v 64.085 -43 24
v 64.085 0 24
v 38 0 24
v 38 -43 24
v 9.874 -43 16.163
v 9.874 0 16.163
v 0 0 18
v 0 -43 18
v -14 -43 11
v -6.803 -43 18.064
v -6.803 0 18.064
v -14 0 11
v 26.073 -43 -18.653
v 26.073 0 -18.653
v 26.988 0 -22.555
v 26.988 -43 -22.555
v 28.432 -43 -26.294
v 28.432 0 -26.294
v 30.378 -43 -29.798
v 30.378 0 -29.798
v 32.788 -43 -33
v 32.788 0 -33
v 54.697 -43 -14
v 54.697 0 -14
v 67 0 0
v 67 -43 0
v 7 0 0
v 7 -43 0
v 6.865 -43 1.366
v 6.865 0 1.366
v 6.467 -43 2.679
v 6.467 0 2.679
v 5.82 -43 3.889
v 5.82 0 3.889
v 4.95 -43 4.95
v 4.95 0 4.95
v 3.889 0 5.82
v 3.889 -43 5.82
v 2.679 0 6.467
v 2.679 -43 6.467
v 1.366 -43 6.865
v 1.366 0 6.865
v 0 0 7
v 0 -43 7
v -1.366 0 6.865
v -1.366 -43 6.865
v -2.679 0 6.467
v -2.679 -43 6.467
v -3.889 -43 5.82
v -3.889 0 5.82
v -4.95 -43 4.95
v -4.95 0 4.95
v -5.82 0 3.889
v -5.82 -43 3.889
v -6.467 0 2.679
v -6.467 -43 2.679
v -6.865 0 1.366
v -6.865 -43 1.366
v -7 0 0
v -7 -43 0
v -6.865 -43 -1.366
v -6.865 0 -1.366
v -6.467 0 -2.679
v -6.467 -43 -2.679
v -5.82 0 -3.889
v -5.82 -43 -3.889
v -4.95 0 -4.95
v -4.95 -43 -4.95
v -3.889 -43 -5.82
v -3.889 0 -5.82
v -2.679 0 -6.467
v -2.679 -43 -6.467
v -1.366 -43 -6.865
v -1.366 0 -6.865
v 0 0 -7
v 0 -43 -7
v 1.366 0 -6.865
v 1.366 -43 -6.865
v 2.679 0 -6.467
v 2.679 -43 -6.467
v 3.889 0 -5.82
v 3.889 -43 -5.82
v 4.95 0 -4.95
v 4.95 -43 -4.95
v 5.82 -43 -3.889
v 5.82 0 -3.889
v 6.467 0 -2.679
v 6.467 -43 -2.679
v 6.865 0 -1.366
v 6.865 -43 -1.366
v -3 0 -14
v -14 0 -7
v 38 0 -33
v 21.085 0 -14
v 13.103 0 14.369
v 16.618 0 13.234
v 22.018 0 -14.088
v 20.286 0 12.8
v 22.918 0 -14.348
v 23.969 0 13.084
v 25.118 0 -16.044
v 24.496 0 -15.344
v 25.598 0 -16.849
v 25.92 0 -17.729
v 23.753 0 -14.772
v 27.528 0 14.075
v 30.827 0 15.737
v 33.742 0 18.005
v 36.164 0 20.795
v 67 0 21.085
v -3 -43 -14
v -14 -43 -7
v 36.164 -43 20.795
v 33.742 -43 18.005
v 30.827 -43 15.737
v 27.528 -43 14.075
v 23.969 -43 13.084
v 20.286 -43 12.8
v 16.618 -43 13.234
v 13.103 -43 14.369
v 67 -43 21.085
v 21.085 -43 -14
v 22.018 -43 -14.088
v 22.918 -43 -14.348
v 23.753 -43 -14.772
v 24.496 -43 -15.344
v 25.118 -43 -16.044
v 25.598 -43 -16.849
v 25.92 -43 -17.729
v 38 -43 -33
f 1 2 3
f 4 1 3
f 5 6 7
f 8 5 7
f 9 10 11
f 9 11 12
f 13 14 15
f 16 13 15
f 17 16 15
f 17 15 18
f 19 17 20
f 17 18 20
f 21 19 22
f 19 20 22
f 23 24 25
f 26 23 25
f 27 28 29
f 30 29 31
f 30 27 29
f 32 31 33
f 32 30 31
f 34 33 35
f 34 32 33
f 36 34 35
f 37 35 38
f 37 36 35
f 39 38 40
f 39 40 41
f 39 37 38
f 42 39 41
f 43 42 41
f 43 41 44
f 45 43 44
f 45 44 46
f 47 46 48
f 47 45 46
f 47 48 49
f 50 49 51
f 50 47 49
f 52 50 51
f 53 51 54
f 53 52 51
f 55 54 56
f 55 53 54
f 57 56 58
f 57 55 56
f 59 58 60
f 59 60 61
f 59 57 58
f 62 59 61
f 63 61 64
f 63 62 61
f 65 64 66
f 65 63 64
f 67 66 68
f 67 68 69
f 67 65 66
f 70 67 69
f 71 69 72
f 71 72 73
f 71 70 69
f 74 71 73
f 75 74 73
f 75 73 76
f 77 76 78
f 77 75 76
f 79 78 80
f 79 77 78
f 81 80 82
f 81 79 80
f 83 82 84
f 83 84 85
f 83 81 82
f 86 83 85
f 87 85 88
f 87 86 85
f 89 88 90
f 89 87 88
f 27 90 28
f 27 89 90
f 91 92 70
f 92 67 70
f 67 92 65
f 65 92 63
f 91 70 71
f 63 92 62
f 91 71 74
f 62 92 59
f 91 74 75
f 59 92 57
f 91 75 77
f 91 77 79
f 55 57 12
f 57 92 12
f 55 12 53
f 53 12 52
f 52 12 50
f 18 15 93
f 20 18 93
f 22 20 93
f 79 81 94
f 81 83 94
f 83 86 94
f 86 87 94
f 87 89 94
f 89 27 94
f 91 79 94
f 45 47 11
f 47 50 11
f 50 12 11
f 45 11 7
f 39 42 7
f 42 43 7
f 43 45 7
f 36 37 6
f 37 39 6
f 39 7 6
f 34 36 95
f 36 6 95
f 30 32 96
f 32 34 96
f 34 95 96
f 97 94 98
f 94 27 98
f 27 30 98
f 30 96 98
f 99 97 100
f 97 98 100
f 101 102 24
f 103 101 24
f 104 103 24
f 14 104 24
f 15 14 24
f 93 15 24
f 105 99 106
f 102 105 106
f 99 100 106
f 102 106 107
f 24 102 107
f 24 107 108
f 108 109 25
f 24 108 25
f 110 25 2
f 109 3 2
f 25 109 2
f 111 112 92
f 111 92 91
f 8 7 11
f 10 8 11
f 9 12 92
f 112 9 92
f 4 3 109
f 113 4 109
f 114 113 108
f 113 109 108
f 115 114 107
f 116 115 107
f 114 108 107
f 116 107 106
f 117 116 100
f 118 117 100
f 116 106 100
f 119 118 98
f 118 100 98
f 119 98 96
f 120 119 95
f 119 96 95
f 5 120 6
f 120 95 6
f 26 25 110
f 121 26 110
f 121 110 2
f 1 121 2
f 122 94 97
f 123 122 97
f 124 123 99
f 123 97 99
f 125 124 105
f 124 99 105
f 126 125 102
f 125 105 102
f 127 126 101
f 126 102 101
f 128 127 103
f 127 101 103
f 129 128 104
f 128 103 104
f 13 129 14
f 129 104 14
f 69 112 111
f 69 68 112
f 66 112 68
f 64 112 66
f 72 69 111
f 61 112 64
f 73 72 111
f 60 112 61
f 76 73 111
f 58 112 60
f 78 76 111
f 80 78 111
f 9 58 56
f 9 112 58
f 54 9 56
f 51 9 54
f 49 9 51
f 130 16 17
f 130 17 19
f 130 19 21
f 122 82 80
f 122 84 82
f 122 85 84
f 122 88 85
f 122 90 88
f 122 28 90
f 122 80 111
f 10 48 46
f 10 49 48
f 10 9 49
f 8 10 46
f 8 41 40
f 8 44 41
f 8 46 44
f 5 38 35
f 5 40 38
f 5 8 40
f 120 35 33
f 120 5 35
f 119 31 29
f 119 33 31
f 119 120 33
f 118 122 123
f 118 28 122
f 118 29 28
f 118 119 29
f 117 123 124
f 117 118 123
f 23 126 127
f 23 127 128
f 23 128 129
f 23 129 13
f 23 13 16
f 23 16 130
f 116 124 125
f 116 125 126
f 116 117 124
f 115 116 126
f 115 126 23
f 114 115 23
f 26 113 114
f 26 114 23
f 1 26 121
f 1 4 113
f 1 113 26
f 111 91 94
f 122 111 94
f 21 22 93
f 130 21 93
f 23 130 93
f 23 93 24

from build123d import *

# Parameters (mm, degrees)
F0_R     = 7
F1_DEPTH = 43


with BuildPart() as f1:
    # F0 (on Front) → F1 (new body)
    with BuildSketch(Plane.XZ):
        with BuildLine():
            Line((-14, 11), (-14, -7))
            Line((-14, -7), (-3, -14))
            Line((-3, -14), (21.084766, -14))
            Line((21.084766, -14), (54.69697, -14))
            Line((54.69697, -14), (67, 0))
            Line((67, 0), (67, 21.08522))
            Line((67, 21.08522), (64.08522, 24))
            Line((64.08522, 24), (38, 24))
            ThreePointArc((38, 24), (25.772542, 13.493046), (9.873626, 16.163489))
            Line((9.873626, 16.163489), (0, 18))
            Line((0, 18), (-6.802686, 18.063724))
            Line((-6.802686, 18.063724), (-14, 11))
        make_face()
        Circle(F0_R, mode=Mode.SUBTRACT)
        with BuildLine():
            Line((54.69697, -14), (21.084766, -14))
            ThreePointArc((21.084766, -14), (24.495507, -15.34393), (26.072729, -18.653261))
            ThreePointArc((26.072729, -18.653261), (28.431843, -26.294028), (32.788067, -33))
            Line((32.788067, -33), (38, -33))
            Line((38, -33), (54.69697, -14))
        make_face()
    extrude(amount=F1_DEPTH)


solid = f1.part
